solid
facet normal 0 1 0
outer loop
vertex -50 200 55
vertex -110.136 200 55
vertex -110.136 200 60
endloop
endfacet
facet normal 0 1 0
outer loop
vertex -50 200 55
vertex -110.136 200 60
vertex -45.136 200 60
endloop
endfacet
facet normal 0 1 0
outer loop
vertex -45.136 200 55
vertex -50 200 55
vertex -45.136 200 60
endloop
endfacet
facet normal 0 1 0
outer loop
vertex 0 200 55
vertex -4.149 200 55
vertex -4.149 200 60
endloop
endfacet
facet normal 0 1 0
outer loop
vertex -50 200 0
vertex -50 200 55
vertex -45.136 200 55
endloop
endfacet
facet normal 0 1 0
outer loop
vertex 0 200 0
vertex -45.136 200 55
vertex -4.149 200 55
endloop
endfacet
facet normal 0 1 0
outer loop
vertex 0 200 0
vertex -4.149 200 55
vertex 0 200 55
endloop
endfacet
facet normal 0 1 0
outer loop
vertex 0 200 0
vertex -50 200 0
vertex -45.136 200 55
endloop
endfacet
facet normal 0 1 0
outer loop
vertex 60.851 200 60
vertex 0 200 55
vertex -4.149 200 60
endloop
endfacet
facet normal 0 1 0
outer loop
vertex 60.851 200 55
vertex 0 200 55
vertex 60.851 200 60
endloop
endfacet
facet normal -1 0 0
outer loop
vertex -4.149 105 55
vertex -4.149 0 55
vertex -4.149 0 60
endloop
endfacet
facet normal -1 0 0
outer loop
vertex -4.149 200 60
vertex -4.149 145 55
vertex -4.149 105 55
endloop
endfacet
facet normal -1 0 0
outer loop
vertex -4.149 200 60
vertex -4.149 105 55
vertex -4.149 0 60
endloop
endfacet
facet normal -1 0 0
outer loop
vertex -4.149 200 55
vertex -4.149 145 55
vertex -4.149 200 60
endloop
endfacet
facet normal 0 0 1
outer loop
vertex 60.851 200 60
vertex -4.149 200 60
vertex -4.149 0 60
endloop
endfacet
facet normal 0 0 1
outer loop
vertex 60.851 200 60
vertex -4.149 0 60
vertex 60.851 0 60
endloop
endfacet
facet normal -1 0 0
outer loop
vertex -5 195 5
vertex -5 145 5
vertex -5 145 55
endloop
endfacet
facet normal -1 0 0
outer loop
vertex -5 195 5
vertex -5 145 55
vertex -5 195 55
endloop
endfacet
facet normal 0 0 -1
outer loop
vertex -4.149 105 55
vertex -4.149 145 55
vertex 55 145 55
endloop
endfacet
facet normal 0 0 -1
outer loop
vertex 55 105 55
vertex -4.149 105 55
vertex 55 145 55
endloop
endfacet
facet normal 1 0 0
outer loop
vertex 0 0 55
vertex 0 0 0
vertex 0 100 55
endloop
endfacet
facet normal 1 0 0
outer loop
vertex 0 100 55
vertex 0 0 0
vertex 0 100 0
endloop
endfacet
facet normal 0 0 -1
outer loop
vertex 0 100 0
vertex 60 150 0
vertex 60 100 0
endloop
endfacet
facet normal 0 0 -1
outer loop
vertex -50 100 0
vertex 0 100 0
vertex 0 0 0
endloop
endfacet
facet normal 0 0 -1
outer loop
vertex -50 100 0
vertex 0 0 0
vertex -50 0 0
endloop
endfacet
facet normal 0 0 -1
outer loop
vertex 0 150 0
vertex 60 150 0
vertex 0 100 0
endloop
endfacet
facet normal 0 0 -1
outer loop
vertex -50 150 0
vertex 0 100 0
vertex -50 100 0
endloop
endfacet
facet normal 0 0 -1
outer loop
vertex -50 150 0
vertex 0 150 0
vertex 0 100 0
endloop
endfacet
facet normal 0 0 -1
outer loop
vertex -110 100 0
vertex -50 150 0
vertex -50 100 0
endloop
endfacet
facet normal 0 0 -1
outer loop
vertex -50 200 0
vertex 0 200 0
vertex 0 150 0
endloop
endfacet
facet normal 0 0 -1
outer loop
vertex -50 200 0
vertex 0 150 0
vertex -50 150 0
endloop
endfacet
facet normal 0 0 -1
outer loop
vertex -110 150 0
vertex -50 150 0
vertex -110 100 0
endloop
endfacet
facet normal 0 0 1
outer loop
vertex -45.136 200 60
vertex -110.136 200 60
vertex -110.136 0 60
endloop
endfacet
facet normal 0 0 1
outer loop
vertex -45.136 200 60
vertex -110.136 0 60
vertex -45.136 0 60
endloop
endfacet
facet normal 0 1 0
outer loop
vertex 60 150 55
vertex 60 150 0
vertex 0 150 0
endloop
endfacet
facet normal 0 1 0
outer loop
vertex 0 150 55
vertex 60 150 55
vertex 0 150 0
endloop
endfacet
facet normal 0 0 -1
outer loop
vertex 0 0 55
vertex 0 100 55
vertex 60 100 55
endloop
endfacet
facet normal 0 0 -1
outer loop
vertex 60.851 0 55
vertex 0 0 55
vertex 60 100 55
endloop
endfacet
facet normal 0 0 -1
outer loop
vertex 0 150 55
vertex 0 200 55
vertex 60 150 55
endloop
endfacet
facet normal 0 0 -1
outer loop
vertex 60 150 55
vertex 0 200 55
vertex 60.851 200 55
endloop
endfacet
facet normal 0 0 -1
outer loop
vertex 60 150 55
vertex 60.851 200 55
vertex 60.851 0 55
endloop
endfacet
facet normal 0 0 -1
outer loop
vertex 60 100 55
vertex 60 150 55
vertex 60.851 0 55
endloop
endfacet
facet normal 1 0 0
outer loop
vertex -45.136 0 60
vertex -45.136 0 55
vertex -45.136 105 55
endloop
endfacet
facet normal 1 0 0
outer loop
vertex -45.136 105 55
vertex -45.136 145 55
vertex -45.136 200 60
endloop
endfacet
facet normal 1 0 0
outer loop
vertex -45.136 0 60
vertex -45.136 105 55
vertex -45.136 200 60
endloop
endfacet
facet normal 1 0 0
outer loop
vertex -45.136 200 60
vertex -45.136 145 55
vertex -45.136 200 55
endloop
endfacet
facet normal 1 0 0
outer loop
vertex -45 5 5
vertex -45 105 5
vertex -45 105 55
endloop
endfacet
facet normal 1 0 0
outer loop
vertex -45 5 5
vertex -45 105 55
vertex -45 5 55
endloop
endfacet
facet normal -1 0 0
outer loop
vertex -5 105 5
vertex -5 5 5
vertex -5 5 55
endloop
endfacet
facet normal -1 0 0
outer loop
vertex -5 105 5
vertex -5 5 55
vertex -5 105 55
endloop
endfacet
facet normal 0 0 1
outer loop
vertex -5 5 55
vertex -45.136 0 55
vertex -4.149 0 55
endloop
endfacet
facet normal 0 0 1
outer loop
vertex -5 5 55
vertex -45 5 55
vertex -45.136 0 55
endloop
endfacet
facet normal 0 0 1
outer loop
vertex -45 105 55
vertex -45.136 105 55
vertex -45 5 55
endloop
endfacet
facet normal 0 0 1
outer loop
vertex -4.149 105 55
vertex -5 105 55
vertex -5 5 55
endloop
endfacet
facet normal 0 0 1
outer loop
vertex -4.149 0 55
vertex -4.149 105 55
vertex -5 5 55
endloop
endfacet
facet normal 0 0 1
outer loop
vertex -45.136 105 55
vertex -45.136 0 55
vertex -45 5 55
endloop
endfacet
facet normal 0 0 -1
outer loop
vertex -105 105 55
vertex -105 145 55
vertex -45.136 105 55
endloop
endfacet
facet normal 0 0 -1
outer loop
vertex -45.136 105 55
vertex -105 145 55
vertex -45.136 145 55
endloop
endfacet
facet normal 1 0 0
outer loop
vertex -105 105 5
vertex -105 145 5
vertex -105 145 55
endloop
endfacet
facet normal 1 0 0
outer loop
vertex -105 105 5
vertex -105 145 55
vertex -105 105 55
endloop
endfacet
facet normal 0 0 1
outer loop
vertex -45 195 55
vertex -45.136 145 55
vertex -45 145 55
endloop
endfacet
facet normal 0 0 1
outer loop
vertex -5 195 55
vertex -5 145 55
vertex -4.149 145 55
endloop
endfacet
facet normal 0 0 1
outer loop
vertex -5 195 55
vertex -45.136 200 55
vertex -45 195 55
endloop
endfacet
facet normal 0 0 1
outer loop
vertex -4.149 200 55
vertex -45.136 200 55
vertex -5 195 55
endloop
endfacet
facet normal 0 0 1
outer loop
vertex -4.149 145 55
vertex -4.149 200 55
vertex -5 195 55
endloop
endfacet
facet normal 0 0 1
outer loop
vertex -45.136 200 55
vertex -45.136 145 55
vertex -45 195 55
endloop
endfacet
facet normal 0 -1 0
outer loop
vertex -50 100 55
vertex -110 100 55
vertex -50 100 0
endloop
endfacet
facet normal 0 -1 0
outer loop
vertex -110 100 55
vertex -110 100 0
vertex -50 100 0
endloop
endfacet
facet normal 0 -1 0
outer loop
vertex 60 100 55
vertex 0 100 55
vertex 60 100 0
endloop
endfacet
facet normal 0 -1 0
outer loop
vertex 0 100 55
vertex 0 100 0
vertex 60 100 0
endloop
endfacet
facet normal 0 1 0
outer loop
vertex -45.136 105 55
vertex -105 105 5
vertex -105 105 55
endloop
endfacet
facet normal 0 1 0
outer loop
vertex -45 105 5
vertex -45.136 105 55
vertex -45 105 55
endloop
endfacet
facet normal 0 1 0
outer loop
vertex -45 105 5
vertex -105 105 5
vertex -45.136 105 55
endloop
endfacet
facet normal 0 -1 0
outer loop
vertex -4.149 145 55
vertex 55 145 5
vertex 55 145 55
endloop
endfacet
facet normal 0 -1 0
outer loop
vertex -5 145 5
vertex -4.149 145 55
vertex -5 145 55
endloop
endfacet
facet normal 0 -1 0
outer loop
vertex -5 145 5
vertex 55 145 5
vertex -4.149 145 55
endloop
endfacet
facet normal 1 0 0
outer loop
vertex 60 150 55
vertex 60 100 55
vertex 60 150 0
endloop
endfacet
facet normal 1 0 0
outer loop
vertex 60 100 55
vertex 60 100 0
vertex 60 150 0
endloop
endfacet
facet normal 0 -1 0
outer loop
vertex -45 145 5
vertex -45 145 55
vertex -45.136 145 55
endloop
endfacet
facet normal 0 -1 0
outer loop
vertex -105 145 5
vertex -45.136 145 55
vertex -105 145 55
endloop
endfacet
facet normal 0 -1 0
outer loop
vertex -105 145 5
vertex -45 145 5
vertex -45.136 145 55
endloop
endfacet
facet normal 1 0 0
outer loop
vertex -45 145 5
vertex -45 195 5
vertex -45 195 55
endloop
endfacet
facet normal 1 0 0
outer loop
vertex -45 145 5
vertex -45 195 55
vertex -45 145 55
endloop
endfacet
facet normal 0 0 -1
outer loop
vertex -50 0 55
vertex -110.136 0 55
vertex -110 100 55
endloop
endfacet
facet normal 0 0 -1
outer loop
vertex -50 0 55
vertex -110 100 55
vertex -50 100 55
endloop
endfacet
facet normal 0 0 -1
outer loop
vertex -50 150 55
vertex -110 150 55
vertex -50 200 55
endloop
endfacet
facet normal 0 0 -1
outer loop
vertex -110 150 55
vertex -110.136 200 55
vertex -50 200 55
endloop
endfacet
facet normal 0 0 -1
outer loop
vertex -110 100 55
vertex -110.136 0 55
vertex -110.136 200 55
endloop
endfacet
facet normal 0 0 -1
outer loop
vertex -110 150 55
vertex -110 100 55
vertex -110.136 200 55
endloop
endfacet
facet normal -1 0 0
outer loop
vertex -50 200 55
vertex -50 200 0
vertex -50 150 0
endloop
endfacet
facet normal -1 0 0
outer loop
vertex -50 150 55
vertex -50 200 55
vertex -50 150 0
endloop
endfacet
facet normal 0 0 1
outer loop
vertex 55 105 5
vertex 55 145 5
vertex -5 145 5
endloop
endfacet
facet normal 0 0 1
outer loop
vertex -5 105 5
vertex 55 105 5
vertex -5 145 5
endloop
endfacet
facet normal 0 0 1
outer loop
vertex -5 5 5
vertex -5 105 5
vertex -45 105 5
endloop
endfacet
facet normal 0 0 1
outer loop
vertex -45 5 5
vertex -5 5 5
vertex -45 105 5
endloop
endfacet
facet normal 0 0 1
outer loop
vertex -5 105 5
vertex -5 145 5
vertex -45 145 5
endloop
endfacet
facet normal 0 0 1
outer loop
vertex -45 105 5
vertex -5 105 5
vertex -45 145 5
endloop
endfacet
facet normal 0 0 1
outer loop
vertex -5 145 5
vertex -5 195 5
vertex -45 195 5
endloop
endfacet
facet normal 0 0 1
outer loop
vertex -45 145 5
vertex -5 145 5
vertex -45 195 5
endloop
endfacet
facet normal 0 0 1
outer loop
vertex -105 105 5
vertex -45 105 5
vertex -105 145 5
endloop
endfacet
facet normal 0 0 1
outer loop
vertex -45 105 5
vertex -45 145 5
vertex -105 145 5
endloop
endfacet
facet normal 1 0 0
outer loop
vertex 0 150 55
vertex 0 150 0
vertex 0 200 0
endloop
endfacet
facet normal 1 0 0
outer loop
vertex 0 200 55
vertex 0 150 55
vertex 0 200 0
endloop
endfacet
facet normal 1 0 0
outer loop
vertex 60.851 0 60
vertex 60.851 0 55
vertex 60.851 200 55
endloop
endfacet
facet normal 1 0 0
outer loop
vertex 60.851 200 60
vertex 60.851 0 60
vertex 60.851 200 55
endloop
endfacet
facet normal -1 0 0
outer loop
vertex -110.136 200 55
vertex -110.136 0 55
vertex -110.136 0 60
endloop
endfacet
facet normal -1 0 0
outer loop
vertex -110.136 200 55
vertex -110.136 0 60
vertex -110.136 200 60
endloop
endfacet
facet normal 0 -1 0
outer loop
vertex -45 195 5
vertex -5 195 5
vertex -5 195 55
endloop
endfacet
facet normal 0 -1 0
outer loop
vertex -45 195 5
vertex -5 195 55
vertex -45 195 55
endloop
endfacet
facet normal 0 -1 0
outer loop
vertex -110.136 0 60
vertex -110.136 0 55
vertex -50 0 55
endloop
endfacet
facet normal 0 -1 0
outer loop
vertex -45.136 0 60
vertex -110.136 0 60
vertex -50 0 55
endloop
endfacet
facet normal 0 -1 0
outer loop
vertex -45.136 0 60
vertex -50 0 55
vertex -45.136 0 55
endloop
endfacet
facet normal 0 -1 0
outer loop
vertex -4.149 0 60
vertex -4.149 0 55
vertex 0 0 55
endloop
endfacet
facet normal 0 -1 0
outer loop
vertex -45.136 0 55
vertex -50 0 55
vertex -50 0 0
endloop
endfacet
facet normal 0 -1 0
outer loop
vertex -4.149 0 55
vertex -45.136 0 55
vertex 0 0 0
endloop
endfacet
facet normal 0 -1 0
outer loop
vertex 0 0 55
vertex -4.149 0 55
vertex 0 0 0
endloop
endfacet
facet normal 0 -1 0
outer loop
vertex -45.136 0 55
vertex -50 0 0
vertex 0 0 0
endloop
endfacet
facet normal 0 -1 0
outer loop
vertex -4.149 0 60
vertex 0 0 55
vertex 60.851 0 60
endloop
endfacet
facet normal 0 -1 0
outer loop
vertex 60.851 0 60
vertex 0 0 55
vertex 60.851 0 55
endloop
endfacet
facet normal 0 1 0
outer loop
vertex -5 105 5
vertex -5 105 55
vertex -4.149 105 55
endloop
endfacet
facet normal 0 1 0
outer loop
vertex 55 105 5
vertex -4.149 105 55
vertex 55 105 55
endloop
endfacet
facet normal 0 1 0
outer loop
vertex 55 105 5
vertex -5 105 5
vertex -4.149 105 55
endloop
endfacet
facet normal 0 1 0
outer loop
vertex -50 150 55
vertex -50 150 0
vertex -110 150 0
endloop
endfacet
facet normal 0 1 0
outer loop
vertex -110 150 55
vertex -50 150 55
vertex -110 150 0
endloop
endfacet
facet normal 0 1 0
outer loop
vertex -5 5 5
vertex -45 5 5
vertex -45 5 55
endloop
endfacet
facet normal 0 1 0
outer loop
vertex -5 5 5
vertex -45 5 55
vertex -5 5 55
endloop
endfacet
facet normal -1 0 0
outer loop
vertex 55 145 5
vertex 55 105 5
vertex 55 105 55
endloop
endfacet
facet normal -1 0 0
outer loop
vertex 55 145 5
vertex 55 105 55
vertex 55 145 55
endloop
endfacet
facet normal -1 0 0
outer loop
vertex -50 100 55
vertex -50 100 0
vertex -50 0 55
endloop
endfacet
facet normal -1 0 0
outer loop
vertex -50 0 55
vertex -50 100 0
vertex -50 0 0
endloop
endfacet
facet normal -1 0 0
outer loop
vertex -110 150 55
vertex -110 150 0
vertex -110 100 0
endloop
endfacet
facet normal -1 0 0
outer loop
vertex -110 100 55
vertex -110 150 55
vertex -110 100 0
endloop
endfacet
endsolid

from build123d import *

# Parameters (mm, degrees)
BOSS_EXTRU_2_DEPTH = 5
BOSS_EXTRU_3_DEPTH = 50
ESQUISSE3_W        = 65
ESQUISSE3_H        = 200
BOSS_EXTRU_7_DEPTH = 5
ESQUISSE8_W        = 65
ESQUISSE8_H        = 200
BOSS_EXTRU_8_DEPTH = 5


with BuildPart() as part:
    # Esquisse1 → Boss.-Extru.2 (new body)
    with BuildSketch(Plane.XY):
        Polygon((-50, 100), (-110, 100), (-110, 150), (-50, 150), (-50, 200), (0, 200), (0, 150), (60, 150), (60, 100), (0, 100), (0, 0), (-50, 0), align=None)
    extrude(amount=BOSS_EXTRU_2_DEPTH)

    # Esquisse2 → Boss.-Extru.3 (add)
    with BuildSketch(Plane.XY.offset(5)):
        Polygon((-110, 150), (-110, 100), (-50, 100), (-50, 0), (0, 0), (0, 100), (60, 100), (60, 150), (0, 150), (0, 200), (-50, 200), (-50, 150), align=None)
        Polygon((-105, 145), (-105, 105), (-45, 105), (-45, 5), (-5, 5), (-5, 105), (55, 105), (55, 145), (-5, 145), (-5, 195), (-45, 195), (-45, 145), align=None, mode=Mode.SUBTRACT)
    extrude(amount=BOSS_EXTRU_3_DEPTH)

    # Esquisse3 → Boss.-Extru.7 (add)
    with BuildSketch(Plane.XY.offset(55)):
        with Locations((-77.636000324, 100)):
            Rectangle(ESQUISSE3_W, ESQUISSE3_H)
    extrude(amount=BOSS_EXTRU_7_DEPTH)

    # Esquisse8 → Boss.-Extru.8 (add)
    with BuildSketch(Plane.XY.offset(55)):
        with Locations((28.350884712, 100)):
            Rectangle(ESQUISSE8_W, ESQUISSE8_H)
    extrude(amount=BOSS_EXTRU_8_DEPTH)


solid = part.part
